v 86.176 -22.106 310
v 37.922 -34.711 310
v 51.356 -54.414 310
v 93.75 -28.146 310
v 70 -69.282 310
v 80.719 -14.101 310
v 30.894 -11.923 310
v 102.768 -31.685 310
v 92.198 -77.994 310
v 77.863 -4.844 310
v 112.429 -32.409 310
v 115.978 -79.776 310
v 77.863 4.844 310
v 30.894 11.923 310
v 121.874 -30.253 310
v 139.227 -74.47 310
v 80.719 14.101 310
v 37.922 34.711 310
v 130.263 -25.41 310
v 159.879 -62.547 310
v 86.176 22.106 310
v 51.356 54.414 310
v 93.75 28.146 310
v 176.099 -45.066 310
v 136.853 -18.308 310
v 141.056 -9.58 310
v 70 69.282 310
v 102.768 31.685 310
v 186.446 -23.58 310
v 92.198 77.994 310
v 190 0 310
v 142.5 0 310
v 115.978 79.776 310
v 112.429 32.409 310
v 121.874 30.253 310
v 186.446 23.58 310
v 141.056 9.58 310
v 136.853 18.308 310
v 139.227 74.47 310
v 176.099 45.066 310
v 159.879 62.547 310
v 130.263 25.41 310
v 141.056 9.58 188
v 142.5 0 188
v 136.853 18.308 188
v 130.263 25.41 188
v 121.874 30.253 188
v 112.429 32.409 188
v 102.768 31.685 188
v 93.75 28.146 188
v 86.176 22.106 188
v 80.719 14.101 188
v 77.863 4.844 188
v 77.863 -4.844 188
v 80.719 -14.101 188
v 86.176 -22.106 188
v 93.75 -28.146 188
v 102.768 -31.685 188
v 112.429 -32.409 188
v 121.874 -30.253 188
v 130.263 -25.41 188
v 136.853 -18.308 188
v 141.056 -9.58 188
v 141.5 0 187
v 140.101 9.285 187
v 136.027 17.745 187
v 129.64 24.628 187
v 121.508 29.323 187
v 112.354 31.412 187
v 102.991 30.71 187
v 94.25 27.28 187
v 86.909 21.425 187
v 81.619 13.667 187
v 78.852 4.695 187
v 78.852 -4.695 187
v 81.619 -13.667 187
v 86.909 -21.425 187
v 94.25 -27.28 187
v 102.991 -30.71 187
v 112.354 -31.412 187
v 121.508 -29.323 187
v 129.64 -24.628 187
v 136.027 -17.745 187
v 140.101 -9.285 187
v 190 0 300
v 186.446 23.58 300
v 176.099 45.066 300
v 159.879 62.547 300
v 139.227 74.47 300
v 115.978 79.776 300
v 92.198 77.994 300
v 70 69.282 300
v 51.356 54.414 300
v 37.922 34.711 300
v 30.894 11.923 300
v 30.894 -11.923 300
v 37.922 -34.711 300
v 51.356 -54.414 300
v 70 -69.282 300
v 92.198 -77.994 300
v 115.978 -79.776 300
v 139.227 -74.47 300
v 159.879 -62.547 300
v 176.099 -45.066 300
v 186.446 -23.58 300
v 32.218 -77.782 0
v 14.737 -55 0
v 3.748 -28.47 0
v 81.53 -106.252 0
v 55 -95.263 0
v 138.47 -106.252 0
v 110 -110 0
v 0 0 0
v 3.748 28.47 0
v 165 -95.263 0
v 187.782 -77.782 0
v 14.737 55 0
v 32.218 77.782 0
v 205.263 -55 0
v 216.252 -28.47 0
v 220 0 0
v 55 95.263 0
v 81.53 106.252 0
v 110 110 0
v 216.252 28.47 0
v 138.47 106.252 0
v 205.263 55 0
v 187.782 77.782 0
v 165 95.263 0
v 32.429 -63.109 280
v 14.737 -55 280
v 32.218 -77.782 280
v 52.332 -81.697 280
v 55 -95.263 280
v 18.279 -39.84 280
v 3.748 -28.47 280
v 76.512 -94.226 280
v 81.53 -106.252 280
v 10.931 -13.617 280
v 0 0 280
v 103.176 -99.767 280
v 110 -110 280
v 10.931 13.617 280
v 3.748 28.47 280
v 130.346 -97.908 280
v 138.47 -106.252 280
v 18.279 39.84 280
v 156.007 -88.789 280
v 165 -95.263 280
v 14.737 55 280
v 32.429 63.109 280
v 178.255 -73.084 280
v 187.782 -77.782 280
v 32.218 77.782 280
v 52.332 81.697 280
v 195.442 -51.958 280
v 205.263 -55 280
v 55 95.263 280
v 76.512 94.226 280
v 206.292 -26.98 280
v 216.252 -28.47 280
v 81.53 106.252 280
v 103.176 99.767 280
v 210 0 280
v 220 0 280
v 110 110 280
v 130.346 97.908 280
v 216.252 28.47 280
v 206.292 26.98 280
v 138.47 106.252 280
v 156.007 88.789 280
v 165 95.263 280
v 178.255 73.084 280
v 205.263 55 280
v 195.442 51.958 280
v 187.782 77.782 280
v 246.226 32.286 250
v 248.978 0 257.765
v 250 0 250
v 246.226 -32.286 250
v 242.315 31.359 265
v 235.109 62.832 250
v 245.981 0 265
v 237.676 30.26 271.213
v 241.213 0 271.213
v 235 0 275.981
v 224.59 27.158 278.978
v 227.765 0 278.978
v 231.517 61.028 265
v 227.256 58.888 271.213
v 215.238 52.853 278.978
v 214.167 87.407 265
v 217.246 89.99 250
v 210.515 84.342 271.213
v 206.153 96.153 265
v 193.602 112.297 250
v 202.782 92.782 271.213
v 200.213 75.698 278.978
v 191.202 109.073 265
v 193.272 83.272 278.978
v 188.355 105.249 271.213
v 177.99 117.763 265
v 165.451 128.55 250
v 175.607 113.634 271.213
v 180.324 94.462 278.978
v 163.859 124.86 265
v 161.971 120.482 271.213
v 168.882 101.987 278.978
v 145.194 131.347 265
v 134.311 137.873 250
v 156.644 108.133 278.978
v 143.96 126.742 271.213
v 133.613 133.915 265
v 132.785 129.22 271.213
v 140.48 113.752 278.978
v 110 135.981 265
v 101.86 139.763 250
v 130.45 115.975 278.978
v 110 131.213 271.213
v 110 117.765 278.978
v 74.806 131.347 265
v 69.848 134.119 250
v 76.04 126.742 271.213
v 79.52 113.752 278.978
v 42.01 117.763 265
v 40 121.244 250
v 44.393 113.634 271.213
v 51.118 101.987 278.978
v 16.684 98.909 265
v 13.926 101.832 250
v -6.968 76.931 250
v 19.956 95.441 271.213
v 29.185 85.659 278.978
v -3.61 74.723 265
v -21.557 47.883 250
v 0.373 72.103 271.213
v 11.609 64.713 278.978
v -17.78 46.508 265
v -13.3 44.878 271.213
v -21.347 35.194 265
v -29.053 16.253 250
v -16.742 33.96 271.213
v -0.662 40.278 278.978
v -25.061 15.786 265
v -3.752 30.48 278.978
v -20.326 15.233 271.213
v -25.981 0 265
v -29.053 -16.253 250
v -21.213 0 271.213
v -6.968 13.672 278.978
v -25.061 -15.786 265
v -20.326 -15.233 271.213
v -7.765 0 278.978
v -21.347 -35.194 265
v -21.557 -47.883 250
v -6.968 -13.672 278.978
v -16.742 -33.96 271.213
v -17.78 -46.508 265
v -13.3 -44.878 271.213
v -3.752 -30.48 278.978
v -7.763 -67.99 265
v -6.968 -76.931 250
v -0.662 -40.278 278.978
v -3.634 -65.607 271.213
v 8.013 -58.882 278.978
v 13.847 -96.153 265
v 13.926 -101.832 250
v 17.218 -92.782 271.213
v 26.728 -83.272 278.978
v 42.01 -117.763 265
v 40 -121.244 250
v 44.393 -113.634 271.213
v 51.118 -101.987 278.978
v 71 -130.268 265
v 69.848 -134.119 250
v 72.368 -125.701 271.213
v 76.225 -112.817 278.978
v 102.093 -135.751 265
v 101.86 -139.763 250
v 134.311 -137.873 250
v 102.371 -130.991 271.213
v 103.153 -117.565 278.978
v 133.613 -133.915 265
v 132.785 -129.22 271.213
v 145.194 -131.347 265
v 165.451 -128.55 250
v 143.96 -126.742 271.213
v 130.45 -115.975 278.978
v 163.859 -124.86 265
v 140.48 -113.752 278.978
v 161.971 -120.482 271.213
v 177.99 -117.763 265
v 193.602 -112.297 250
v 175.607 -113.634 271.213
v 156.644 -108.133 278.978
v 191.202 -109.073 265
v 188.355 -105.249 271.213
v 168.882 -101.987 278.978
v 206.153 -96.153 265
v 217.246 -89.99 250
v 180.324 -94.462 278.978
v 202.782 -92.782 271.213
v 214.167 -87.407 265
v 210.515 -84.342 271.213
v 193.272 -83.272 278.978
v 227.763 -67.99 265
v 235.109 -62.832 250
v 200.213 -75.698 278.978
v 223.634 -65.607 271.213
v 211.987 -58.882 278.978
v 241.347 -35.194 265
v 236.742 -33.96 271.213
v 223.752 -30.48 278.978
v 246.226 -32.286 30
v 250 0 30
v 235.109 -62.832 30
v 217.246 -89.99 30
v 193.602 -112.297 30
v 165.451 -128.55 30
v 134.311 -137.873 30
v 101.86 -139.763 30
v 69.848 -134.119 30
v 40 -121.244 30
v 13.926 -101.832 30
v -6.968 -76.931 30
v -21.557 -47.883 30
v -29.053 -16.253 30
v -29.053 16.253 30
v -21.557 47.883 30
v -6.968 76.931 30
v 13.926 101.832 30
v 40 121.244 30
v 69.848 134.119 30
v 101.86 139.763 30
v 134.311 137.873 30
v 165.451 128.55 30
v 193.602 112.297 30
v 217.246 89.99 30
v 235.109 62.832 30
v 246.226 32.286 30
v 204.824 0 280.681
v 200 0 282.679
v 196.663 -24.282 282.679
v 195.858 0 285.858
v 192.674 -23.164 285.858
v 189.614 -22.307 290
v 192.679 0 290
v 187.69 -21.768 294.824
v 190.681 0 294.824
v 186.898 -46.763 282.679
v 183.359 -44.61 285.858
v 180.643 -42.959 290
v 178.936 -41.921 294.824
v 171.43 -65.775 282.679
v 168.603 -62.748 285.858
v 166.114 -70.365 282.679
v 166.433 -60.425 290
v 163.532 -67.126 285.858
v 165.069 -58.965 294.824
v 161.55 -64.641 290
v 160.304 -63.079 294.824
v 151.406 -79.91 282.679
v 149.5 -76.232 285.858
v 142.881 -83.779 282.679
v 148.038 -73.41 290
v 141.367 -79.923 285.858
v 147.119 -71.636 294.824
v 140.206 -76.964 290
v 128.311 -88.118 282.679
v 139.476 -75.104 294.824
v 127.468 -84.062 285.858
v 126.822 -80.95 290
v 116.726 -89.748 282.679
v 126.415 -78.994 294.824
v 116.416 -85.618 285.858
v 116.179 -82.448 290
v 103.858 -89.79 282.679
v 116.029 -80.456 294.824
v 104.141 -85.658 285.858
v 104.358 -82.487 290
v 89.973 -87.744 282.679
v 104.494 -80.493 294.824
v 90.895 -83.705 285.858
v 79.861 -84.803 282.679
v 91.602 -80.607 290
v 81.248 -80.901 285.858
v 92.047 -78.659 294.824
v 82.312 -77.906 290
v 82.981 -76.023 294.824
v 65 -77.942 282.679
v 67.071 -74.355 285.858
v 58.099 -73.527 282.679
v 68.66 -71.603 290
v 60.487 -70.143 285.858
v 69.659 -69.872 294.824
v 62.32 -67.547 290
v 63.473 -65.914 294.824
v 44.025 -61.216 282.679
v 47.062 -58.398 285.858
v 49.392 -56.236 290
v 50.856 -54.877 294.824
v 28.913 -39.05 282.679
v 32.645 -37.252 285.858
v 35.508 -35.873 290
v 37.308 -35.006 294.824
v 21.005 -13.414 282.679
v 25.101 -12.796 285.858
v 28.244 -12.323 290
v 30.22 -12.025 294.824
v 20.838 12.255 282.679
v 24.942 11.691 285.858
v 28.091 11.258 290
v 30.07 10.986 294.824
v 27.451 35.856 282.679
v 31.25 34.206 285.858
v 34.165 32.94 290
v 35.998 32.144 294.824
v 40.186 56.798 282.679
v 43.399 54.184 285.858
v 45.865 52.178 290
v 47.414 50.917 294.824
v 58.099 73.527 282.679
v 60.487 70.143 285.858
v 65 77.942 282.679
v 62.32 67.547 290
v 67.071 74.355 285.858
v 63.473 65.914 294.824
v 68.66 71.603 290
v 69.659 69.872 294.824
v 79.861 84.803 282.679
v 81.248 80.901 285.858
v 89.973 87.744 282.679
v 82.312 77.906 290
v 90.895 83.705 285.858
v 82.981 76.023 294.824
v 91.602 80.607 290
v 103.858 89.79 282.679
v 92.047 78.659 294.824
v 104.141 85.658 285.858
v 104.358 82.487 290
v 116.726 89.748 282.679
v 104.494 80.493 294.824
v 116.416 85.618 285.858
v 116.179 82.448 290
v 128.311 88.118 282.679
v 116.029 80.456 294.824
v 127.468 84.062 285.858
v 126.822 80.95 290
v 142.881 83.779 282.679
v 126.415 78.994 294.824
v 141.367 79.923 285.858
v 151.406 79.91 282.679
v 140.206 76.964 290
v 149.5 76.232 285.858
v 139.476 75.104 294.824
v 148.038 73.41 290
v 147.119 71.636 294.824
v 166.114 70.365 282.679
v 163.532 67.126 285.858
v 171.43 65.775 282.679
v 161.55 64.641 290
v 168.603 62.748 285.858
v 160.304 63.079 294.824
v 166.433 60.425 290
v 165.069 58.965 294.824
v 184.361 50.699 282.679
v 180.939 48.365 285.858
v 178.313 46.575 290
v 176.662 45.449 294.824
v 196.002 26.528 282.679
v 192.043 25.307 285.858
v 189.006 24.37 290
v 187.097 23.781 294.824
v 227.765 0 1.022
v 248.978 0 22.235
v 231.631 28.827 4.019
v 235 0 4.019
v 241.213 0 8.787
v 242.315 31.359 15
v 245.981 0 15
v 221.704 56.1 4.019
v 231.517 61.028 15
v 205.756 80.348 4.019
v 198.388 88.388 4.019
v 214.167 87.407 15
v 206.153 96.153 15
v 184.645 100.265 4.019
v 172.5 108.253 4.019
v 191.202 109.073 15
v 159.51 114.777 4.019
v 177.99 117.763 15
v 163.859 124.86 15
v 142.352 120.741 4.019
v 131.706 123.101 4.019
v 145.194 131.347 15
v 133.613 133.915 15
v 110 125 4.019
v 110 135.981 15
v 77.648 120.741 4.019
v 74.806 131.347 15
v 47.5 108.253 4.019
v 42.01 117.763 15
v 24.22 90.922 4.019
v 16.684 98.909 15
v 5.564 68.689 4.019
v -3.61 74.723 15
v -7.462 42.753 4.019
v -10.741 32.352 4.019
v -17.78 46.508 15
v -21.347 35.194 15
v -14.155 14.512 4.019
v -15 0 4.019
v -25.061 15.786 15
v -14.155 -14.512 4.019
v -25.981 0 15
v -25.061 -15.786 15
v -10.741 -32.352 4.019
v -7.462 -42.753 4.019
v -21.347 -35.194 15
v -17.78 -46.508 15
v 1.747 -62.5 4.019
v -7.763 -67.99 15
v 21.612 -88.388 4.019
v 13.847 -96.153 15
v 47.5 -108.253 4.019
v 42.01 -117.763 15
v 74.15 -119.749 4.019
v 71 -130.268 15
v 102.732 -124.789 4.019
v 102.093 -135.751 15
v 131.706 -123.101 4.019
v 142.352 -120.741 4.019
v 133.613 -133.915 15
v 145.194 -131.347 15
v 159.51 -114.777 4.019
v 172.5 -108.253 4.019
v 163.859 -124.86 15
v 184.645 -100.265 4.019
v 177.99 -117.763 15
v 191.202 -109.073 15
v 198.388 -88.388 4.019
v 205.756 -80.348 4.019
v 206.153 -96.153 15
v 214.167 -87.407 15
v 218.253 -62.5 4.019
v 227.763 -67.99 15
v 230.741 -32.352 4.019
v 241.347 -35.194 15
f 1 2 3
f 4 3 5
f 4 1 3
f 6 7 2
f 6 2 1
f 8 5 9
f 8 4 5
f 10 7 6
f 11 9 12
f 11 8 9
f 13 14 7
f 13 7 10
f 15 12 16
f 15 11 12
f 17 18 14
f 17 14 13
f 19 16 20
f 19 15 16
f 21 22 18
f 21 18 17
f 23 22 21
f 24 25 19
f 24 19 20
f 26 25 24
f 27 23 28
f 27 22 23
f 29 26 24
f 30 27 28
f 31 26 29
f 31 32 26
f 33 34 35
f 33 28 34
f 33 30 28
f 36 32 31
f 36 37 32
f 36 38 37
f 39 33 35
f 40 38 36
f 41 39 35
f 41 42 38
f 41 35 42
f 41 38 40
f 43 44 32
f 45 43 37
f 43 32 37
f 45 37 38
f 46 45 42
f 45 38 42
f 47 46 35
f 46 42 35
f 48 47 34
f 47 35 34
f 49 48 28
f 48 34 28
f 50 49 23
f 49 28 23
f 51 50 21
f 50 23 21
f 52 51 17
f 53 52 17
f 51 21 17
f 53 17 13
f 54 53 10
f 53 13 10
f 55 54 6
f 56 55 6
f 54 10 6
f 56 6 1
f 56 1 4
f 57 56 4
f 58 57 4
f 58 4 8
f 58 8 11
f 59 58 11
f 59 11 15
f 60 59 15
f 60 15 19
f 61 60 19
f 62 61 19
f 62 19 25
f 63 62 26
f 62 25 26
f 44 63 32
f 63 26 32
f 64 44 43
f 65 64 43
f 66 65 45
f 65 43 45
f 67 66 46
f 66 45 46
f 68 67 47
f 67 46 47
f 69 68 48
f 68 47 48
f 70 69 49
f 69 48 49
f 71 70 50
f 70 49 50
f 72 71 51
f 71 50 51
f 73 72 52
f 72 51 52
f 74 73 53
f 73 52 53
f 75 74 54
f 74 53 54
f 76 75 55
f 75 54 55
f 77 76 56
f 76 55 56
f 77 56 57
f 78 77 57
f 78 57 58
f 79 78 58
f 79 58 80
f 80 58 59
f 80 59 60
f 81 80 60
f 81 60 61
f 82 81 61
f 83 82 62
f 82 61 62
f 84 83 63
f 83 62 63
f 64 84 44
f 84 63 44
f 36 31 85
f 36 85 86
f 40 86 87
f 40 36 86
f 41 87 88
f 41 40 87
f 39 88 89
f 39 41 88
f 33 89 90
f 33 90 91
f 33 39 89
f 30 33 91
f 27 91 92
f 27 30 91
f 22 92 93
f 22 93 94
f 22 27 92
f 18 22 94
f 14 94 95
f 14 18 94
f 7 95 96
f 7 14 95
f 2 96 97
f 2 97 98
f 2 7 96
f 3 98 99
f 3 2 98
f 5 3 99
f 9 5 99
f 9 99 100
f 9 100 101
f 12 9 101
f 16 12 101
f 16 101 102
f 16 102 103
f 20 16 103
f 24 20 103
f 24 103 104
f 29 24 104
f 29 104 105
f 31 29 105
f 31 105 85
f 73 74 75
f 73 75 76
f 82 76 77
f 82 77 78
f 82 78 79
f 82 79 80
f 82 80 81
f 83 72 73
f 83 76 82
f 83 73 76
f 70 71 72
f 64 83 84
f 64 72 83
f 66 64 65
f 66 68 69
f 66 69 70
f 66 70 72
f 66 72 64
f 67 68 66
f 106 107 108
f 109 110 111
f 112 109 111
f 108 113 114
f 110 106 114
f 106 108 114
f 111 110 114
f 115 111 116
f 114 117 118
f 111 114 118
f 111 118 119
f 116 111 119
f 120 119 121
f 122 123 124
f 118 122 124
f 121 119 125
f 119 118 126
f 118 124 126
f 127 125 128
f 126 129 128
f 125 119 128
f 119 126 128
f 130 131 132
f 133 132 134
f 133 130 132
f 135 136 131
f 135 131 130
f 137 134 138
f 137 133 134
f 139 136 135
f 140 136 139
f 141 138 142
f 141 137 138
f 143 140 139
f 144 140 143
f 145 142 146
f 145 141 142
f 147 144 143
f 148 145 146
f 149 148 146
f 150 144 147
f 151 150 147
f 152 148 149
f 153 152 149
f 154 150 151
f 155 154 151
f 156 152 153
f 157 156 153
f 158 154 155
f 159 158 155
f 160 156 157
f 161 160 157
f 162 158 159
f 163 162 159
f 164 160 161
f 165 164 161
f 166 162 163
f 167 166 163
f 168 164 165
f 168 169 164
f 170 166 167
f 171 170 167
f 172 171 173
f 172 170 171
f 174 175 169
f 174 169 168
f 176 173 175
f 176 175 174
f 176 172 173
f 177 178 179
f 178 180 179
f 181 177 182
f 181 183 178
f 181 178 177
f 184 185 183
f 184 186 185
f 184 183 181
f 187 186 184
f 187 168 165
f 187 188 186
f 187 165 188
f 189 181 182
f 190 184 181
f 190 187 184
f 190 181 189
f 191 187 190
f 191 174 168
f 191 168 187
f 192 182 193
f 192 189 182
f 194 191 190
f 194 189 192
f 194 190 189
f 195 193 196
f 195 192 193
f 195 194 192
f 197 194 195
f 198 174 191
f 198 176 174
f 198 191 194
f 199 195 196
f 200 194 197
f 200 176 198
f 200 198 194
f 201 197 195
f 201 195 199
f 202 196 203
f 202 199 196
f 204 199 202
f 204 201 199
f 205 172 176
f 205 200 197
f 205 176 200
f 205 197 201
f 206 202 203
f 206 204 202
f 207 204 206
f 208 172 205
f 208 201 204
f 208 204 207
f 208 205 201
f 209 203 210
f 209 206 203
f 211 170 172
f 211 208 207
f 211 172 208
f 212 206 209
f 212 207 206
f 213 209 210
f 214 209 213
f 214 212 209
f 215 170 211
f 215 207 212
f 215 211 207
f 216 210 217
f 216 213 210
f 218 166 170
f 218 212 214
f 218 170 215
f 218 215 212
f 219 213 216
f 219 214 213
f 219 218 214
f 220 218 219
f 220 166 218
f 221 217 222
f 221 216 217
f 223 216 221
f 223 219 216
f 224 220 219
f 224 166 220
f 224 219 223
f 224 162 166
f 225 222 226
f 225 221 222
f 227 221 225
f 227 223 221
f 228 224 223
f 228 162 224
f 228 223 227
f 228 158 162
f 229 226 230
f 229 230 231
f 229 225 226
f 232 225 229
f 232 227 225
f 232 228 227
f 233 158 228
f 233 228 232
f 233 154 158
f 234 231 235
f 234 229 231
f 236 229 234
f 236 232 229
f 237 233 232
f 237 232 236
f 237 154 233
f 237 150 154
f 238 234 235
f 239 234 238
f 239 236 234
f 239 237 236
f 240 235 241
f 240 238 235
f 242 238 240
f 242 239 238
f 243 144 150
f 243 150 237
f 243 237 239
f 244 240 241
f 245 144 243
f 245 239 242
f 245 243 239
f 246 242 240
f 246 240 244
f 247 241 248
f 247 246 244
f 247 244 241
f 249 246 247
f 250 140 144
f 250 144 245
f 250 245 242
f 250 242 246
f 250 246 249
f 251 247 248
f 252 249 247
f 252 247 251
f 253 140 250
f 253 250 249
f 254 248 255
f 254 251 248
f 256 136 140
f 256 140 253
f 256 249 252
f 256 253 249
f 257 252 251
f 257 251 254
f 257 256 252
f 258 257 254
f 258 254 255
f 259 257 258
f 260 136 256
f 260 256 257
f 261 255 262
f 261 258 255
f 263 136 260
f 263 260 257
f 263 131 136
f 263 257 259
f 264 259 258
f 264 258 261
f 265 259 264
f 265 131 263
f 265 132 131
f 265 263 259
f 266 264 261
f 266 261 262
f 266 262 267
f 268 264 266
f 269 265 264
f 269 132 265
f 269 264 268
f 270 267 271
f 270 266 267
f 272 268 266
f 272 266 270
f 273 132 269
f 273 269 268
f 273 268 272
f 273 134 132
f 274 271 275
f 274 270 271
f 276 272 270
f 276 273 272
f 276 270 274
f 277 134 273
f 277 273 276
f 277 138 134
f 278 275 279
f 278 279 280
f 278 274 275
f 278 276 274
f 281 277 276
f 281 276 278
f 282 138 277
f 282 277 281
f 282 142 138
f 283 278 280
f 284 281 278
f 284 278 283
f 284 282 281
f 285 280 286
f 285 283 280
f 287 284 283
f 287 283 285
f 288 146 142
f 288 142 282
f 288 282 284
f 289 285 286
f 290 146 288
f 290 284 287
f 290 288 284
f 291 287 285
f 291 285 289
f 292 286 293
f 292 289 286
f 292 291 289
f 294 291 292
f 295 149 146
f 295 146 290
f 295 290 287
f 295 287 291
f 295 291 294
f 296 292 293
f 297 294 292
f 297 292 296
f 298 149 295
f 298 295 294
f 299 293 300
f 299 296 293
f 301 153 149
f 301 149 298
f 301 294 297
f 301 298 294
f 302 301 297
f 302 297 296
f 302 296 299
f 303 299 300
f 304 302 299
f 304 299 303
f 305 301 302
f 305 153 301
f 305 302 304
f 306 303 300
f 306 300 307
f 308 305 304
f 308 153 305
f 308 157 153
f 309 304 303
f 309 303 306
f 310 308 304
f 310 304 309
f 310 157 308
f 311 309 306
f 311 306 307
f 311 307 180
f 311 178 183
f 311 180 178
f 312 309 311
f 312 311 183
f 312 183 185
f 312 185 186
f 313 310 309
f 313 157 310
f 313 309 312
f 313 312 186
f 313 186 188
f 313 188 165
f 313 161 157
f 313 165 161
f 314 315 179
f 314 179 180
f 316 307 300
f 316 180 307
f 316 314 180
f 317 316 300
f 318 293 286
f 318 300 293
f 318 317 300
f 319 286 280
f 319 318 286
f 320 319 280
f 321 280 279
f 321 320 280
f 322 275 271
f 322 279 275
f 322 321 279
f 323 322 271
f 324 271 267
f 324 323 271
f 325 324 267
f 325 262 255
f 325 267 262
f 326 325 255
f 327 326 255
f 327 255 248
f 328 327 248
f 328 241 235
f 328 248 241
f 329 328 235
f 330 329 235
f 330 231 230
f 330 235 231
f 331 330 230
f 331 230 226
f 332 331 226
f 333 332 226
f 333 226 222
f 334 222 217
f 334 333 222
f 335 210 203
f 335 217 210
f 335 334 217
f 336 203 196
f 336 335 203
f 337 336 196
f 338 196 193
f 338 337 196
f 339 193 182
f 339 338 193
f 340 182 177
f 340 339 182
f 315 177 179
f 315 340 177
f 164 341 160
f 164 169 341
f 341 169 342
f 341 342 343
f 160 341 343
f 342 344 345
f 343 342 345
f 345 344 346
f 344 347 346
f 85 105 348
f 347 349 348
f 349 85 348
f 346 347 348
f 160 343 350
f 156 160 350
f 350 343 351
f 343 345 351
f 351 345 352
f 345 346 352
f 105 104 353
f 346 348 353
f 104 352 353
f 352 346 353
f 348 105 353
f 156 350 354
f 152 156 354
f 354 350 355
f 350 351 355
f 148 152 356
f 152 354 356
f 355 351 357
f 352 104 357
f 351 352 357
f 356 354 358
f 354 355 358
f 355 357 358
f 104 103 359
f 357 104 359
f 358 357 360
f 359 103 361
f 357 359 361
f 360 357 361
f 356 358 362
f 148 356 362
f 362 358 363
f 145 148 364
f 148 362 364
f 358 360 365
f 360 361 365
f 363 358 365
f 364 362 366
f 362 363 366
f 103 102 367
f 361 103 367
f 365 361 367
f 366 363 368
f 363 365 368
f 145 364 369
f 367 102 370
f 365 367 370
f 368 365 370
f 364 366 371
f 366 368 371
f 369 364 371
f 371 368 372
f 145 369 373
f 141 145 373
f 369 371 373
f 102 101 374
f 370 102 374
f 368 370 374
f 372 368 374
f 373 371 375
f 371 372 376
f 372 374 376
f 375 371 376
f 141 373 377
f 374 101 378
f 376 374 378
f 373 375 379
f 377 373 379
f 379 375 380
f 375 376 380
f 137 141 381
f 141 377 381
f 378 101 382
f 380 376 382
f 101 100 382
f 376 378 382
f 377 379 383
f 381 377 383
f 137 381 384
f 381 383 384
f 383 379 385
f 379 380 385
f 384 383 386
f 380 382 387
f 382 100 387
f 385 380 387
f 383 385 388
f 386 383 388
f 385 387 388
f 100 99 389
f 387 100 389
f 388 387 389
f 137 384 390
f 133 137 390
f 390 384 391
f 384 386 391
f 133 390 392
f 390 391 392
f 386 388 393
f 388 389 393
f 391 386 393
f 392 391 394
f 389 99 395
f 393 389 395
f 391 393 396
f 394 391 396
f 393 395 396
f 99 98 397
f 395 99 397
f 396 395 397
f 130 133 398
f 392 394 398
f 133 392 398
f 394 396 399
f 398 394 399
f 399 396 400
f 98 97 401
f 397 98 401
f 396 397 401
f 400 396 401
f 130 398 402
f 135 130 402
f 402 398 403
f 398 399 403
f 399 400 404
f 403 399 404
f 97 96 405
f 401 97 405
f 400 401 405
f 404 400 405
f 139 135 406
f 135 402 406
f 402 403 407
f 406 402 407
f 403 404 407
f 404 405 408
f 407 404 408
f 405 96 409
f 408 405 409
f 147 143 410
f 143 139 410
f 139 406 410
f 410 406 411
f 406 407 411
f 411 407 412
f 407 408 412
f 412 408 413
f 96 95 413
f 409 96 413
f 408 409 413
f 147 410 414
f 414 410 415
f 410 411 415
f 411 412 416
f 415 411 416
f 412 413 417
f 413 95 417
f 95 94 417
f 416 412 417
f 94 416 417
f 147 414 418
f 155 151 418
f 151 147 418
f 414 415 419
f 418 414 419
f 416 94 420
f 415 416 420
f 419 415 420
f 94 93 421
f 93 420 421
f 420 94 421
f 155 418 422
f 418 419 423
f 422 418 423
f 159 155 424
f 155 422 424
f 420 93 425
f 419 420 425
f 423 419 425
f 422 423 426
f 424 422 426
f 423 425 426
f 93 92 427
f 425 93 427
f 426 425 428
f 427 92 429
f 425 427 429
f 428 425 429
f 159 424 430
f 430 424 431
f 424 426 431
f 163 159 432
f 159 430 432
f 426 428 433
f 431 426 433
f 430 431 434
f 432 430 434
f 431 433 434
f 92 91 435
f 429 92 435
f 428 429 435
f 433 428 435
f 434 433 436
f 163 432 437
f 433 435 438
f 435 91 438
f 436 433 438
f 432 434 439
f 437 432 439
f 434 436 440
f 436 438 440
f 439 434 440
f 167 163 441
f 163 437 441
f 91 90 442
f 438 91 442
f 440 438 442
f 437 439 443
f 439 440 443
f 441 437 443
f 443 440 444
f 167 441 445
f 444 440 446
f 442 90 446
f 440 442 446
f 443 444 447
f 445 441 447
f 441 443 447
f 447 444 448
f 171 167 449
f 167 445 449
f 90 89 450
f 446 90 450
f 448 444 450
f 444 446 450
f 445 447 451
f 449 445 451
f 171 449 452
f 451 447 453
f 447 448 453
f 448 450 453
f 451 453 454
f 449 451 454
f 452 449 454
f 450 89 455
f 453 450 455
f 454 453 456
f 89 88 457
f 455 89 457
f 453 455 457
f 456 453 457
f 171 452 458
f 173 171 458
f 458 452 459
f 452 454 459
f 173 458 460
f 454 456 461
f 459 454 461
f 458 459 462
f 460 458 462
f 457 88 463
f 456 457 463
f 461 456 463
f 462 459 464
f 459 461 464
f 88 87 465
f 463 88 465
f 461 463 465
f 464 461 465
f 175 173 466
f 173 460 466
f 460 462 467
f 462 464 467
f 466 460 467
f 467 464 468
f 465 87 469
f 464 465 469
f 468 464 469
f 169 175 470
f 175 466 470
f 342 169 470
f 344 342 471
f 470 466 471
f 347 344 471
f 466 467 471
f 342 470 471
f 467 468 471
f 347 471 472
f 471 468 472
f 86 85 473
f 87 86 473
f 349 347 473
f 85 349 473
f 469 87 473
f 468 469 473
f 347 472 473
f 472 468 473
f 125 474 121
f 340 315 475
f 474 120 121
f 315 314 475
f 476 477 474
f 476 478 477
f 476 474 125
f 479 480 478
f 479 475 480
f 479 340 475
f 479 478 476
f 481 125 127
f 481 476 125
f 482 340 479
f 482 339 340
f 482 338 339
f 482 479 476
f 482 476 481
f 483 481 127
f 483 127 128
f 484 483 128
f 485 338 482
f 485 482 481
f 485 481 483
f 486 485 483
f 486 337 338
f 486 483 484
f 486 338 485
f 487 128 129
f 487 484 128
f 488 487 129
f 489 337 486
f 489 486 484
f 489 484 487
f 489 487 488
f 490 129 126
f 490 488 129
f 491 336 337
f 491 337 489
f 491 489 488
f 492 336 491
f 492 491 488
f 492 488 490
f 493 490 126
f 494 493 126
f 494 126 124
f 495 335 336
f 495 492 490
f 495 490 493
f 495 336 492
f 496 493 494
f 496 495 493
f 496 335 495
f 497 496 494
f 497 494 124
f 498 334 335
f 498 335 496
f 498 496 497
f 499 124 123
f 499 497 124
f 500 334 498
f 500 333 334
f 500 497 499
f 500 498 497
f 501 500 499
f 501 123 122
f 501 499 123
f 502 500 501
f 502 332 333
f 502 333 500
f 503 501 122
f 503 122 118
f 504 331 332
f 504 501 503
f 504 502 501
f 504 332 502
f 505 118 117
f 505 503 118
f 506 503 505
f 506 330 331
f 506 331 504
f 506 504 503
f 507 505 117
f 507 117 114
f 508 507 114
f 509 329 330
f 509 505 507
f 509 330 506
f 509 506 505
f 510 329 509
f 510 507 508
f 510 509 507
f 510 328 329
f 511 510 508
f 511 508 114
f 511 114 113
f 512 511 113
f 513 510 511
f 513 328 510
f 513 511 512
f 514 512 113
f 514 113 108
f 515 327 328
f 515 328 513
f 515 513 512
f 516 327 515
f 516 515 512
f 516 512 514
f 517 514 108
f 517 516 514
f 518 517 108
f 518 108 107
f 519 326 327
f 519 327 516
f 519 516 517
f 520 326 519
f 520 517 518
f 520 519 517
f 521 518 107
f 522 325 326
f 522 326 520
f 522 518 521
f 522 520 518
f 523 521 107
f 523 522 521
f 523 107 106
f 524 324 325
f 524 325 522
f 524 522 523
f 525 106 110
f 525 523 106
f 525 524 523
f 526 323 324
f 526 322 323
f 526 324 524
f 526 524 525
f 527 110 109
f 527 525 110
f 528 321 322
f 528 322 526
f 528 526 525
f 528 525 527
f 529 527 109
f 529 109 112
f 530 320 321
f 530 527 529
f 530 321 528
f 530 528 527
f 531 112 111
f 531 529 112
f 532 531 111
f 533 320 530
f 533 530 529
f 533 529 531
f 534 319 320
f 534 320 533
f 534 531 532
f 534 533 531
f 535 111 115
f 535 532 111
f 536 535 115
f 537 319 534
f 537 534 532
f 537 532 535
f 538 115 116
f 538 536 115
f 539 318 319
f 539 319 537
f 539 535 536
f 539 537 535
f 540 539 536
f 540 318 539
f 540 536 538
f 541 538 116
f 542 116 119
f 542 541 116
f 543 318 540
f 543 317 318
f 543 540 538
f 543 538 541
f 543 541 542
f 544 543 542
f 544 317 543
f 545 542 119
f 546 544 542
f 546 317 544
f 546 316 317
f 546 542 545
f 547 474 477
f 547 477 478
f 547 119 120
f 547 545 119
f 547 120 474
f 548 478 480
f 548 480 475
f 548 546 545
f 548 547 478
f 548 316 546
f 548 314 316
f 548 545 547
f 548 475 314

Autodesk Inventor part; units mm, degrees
ref_plane "YZ Plane" through (0, 0, 0) normal (1, 0, 0) x (0, 1, 0)
ref_plane "XZ Plane" through (0, 0, 0) normal (0, 1, 0) x (-1, 0, 0)
ref_plane "XY Plane" through (0, 0, 0) normal (0, 0, 1) x (1, 0, 0)
ref_plane "Płaszczyzna konstrukcyjna1" through (0, 0, 0) normal (0, 0, 1) x (1, 0, 0)
sketch "Szkic1" plane through (0, 0, 0) normal (0, 0, 1) x (1, 0, 0)
  circle A0 centre (110, 0) radius 110 projected
  circle A1 centre (110, 0) radius 140 projected
  point P0 (0, 0)
extrude "Wyciągnięcie proste1" add sketch "Szkic1" along normal blind 310 contours A0 | A1
fillet "Zaokrąglenie1" radius 30 1 edges at (-30, 0, 0)
sketch "Szkic2" plane through (110, 0, 310) normal (0, 0, 1) x (1, 0, 0)
  circle A0 centre (0, 0) radius 80
  circle A1 centre (0, 0) radius 140
  point P0 (-110, 0)
  dimension "d3" = 160
extrude "Wyciągnięcie proste2" cut sketch "Szkic2" against normal blind 30
fillet "Zaokrąglenie2" radius 30 1 edges at (-30, 0, 280)
fillet "Zaokrąglenie3" radius 20 1 edges at (30, 0, 280)
sketch "Szkic3" plane through (110, 0, 310) normal (0, 0, 1) x (1, 0, 0)
  circle A0 centre (0, 0) radius 32.5
  point P0 (-110, 0)
  dimension "d8" = 65
extrude "Wyciągnięcie proste3" cut sketch "Szkic3" against normal blind 123
chamfer "Faza1" distance 1 angle 45 1 edges at (77.5, 0, 187)
properties part number "wodaxD" material "Woda"
